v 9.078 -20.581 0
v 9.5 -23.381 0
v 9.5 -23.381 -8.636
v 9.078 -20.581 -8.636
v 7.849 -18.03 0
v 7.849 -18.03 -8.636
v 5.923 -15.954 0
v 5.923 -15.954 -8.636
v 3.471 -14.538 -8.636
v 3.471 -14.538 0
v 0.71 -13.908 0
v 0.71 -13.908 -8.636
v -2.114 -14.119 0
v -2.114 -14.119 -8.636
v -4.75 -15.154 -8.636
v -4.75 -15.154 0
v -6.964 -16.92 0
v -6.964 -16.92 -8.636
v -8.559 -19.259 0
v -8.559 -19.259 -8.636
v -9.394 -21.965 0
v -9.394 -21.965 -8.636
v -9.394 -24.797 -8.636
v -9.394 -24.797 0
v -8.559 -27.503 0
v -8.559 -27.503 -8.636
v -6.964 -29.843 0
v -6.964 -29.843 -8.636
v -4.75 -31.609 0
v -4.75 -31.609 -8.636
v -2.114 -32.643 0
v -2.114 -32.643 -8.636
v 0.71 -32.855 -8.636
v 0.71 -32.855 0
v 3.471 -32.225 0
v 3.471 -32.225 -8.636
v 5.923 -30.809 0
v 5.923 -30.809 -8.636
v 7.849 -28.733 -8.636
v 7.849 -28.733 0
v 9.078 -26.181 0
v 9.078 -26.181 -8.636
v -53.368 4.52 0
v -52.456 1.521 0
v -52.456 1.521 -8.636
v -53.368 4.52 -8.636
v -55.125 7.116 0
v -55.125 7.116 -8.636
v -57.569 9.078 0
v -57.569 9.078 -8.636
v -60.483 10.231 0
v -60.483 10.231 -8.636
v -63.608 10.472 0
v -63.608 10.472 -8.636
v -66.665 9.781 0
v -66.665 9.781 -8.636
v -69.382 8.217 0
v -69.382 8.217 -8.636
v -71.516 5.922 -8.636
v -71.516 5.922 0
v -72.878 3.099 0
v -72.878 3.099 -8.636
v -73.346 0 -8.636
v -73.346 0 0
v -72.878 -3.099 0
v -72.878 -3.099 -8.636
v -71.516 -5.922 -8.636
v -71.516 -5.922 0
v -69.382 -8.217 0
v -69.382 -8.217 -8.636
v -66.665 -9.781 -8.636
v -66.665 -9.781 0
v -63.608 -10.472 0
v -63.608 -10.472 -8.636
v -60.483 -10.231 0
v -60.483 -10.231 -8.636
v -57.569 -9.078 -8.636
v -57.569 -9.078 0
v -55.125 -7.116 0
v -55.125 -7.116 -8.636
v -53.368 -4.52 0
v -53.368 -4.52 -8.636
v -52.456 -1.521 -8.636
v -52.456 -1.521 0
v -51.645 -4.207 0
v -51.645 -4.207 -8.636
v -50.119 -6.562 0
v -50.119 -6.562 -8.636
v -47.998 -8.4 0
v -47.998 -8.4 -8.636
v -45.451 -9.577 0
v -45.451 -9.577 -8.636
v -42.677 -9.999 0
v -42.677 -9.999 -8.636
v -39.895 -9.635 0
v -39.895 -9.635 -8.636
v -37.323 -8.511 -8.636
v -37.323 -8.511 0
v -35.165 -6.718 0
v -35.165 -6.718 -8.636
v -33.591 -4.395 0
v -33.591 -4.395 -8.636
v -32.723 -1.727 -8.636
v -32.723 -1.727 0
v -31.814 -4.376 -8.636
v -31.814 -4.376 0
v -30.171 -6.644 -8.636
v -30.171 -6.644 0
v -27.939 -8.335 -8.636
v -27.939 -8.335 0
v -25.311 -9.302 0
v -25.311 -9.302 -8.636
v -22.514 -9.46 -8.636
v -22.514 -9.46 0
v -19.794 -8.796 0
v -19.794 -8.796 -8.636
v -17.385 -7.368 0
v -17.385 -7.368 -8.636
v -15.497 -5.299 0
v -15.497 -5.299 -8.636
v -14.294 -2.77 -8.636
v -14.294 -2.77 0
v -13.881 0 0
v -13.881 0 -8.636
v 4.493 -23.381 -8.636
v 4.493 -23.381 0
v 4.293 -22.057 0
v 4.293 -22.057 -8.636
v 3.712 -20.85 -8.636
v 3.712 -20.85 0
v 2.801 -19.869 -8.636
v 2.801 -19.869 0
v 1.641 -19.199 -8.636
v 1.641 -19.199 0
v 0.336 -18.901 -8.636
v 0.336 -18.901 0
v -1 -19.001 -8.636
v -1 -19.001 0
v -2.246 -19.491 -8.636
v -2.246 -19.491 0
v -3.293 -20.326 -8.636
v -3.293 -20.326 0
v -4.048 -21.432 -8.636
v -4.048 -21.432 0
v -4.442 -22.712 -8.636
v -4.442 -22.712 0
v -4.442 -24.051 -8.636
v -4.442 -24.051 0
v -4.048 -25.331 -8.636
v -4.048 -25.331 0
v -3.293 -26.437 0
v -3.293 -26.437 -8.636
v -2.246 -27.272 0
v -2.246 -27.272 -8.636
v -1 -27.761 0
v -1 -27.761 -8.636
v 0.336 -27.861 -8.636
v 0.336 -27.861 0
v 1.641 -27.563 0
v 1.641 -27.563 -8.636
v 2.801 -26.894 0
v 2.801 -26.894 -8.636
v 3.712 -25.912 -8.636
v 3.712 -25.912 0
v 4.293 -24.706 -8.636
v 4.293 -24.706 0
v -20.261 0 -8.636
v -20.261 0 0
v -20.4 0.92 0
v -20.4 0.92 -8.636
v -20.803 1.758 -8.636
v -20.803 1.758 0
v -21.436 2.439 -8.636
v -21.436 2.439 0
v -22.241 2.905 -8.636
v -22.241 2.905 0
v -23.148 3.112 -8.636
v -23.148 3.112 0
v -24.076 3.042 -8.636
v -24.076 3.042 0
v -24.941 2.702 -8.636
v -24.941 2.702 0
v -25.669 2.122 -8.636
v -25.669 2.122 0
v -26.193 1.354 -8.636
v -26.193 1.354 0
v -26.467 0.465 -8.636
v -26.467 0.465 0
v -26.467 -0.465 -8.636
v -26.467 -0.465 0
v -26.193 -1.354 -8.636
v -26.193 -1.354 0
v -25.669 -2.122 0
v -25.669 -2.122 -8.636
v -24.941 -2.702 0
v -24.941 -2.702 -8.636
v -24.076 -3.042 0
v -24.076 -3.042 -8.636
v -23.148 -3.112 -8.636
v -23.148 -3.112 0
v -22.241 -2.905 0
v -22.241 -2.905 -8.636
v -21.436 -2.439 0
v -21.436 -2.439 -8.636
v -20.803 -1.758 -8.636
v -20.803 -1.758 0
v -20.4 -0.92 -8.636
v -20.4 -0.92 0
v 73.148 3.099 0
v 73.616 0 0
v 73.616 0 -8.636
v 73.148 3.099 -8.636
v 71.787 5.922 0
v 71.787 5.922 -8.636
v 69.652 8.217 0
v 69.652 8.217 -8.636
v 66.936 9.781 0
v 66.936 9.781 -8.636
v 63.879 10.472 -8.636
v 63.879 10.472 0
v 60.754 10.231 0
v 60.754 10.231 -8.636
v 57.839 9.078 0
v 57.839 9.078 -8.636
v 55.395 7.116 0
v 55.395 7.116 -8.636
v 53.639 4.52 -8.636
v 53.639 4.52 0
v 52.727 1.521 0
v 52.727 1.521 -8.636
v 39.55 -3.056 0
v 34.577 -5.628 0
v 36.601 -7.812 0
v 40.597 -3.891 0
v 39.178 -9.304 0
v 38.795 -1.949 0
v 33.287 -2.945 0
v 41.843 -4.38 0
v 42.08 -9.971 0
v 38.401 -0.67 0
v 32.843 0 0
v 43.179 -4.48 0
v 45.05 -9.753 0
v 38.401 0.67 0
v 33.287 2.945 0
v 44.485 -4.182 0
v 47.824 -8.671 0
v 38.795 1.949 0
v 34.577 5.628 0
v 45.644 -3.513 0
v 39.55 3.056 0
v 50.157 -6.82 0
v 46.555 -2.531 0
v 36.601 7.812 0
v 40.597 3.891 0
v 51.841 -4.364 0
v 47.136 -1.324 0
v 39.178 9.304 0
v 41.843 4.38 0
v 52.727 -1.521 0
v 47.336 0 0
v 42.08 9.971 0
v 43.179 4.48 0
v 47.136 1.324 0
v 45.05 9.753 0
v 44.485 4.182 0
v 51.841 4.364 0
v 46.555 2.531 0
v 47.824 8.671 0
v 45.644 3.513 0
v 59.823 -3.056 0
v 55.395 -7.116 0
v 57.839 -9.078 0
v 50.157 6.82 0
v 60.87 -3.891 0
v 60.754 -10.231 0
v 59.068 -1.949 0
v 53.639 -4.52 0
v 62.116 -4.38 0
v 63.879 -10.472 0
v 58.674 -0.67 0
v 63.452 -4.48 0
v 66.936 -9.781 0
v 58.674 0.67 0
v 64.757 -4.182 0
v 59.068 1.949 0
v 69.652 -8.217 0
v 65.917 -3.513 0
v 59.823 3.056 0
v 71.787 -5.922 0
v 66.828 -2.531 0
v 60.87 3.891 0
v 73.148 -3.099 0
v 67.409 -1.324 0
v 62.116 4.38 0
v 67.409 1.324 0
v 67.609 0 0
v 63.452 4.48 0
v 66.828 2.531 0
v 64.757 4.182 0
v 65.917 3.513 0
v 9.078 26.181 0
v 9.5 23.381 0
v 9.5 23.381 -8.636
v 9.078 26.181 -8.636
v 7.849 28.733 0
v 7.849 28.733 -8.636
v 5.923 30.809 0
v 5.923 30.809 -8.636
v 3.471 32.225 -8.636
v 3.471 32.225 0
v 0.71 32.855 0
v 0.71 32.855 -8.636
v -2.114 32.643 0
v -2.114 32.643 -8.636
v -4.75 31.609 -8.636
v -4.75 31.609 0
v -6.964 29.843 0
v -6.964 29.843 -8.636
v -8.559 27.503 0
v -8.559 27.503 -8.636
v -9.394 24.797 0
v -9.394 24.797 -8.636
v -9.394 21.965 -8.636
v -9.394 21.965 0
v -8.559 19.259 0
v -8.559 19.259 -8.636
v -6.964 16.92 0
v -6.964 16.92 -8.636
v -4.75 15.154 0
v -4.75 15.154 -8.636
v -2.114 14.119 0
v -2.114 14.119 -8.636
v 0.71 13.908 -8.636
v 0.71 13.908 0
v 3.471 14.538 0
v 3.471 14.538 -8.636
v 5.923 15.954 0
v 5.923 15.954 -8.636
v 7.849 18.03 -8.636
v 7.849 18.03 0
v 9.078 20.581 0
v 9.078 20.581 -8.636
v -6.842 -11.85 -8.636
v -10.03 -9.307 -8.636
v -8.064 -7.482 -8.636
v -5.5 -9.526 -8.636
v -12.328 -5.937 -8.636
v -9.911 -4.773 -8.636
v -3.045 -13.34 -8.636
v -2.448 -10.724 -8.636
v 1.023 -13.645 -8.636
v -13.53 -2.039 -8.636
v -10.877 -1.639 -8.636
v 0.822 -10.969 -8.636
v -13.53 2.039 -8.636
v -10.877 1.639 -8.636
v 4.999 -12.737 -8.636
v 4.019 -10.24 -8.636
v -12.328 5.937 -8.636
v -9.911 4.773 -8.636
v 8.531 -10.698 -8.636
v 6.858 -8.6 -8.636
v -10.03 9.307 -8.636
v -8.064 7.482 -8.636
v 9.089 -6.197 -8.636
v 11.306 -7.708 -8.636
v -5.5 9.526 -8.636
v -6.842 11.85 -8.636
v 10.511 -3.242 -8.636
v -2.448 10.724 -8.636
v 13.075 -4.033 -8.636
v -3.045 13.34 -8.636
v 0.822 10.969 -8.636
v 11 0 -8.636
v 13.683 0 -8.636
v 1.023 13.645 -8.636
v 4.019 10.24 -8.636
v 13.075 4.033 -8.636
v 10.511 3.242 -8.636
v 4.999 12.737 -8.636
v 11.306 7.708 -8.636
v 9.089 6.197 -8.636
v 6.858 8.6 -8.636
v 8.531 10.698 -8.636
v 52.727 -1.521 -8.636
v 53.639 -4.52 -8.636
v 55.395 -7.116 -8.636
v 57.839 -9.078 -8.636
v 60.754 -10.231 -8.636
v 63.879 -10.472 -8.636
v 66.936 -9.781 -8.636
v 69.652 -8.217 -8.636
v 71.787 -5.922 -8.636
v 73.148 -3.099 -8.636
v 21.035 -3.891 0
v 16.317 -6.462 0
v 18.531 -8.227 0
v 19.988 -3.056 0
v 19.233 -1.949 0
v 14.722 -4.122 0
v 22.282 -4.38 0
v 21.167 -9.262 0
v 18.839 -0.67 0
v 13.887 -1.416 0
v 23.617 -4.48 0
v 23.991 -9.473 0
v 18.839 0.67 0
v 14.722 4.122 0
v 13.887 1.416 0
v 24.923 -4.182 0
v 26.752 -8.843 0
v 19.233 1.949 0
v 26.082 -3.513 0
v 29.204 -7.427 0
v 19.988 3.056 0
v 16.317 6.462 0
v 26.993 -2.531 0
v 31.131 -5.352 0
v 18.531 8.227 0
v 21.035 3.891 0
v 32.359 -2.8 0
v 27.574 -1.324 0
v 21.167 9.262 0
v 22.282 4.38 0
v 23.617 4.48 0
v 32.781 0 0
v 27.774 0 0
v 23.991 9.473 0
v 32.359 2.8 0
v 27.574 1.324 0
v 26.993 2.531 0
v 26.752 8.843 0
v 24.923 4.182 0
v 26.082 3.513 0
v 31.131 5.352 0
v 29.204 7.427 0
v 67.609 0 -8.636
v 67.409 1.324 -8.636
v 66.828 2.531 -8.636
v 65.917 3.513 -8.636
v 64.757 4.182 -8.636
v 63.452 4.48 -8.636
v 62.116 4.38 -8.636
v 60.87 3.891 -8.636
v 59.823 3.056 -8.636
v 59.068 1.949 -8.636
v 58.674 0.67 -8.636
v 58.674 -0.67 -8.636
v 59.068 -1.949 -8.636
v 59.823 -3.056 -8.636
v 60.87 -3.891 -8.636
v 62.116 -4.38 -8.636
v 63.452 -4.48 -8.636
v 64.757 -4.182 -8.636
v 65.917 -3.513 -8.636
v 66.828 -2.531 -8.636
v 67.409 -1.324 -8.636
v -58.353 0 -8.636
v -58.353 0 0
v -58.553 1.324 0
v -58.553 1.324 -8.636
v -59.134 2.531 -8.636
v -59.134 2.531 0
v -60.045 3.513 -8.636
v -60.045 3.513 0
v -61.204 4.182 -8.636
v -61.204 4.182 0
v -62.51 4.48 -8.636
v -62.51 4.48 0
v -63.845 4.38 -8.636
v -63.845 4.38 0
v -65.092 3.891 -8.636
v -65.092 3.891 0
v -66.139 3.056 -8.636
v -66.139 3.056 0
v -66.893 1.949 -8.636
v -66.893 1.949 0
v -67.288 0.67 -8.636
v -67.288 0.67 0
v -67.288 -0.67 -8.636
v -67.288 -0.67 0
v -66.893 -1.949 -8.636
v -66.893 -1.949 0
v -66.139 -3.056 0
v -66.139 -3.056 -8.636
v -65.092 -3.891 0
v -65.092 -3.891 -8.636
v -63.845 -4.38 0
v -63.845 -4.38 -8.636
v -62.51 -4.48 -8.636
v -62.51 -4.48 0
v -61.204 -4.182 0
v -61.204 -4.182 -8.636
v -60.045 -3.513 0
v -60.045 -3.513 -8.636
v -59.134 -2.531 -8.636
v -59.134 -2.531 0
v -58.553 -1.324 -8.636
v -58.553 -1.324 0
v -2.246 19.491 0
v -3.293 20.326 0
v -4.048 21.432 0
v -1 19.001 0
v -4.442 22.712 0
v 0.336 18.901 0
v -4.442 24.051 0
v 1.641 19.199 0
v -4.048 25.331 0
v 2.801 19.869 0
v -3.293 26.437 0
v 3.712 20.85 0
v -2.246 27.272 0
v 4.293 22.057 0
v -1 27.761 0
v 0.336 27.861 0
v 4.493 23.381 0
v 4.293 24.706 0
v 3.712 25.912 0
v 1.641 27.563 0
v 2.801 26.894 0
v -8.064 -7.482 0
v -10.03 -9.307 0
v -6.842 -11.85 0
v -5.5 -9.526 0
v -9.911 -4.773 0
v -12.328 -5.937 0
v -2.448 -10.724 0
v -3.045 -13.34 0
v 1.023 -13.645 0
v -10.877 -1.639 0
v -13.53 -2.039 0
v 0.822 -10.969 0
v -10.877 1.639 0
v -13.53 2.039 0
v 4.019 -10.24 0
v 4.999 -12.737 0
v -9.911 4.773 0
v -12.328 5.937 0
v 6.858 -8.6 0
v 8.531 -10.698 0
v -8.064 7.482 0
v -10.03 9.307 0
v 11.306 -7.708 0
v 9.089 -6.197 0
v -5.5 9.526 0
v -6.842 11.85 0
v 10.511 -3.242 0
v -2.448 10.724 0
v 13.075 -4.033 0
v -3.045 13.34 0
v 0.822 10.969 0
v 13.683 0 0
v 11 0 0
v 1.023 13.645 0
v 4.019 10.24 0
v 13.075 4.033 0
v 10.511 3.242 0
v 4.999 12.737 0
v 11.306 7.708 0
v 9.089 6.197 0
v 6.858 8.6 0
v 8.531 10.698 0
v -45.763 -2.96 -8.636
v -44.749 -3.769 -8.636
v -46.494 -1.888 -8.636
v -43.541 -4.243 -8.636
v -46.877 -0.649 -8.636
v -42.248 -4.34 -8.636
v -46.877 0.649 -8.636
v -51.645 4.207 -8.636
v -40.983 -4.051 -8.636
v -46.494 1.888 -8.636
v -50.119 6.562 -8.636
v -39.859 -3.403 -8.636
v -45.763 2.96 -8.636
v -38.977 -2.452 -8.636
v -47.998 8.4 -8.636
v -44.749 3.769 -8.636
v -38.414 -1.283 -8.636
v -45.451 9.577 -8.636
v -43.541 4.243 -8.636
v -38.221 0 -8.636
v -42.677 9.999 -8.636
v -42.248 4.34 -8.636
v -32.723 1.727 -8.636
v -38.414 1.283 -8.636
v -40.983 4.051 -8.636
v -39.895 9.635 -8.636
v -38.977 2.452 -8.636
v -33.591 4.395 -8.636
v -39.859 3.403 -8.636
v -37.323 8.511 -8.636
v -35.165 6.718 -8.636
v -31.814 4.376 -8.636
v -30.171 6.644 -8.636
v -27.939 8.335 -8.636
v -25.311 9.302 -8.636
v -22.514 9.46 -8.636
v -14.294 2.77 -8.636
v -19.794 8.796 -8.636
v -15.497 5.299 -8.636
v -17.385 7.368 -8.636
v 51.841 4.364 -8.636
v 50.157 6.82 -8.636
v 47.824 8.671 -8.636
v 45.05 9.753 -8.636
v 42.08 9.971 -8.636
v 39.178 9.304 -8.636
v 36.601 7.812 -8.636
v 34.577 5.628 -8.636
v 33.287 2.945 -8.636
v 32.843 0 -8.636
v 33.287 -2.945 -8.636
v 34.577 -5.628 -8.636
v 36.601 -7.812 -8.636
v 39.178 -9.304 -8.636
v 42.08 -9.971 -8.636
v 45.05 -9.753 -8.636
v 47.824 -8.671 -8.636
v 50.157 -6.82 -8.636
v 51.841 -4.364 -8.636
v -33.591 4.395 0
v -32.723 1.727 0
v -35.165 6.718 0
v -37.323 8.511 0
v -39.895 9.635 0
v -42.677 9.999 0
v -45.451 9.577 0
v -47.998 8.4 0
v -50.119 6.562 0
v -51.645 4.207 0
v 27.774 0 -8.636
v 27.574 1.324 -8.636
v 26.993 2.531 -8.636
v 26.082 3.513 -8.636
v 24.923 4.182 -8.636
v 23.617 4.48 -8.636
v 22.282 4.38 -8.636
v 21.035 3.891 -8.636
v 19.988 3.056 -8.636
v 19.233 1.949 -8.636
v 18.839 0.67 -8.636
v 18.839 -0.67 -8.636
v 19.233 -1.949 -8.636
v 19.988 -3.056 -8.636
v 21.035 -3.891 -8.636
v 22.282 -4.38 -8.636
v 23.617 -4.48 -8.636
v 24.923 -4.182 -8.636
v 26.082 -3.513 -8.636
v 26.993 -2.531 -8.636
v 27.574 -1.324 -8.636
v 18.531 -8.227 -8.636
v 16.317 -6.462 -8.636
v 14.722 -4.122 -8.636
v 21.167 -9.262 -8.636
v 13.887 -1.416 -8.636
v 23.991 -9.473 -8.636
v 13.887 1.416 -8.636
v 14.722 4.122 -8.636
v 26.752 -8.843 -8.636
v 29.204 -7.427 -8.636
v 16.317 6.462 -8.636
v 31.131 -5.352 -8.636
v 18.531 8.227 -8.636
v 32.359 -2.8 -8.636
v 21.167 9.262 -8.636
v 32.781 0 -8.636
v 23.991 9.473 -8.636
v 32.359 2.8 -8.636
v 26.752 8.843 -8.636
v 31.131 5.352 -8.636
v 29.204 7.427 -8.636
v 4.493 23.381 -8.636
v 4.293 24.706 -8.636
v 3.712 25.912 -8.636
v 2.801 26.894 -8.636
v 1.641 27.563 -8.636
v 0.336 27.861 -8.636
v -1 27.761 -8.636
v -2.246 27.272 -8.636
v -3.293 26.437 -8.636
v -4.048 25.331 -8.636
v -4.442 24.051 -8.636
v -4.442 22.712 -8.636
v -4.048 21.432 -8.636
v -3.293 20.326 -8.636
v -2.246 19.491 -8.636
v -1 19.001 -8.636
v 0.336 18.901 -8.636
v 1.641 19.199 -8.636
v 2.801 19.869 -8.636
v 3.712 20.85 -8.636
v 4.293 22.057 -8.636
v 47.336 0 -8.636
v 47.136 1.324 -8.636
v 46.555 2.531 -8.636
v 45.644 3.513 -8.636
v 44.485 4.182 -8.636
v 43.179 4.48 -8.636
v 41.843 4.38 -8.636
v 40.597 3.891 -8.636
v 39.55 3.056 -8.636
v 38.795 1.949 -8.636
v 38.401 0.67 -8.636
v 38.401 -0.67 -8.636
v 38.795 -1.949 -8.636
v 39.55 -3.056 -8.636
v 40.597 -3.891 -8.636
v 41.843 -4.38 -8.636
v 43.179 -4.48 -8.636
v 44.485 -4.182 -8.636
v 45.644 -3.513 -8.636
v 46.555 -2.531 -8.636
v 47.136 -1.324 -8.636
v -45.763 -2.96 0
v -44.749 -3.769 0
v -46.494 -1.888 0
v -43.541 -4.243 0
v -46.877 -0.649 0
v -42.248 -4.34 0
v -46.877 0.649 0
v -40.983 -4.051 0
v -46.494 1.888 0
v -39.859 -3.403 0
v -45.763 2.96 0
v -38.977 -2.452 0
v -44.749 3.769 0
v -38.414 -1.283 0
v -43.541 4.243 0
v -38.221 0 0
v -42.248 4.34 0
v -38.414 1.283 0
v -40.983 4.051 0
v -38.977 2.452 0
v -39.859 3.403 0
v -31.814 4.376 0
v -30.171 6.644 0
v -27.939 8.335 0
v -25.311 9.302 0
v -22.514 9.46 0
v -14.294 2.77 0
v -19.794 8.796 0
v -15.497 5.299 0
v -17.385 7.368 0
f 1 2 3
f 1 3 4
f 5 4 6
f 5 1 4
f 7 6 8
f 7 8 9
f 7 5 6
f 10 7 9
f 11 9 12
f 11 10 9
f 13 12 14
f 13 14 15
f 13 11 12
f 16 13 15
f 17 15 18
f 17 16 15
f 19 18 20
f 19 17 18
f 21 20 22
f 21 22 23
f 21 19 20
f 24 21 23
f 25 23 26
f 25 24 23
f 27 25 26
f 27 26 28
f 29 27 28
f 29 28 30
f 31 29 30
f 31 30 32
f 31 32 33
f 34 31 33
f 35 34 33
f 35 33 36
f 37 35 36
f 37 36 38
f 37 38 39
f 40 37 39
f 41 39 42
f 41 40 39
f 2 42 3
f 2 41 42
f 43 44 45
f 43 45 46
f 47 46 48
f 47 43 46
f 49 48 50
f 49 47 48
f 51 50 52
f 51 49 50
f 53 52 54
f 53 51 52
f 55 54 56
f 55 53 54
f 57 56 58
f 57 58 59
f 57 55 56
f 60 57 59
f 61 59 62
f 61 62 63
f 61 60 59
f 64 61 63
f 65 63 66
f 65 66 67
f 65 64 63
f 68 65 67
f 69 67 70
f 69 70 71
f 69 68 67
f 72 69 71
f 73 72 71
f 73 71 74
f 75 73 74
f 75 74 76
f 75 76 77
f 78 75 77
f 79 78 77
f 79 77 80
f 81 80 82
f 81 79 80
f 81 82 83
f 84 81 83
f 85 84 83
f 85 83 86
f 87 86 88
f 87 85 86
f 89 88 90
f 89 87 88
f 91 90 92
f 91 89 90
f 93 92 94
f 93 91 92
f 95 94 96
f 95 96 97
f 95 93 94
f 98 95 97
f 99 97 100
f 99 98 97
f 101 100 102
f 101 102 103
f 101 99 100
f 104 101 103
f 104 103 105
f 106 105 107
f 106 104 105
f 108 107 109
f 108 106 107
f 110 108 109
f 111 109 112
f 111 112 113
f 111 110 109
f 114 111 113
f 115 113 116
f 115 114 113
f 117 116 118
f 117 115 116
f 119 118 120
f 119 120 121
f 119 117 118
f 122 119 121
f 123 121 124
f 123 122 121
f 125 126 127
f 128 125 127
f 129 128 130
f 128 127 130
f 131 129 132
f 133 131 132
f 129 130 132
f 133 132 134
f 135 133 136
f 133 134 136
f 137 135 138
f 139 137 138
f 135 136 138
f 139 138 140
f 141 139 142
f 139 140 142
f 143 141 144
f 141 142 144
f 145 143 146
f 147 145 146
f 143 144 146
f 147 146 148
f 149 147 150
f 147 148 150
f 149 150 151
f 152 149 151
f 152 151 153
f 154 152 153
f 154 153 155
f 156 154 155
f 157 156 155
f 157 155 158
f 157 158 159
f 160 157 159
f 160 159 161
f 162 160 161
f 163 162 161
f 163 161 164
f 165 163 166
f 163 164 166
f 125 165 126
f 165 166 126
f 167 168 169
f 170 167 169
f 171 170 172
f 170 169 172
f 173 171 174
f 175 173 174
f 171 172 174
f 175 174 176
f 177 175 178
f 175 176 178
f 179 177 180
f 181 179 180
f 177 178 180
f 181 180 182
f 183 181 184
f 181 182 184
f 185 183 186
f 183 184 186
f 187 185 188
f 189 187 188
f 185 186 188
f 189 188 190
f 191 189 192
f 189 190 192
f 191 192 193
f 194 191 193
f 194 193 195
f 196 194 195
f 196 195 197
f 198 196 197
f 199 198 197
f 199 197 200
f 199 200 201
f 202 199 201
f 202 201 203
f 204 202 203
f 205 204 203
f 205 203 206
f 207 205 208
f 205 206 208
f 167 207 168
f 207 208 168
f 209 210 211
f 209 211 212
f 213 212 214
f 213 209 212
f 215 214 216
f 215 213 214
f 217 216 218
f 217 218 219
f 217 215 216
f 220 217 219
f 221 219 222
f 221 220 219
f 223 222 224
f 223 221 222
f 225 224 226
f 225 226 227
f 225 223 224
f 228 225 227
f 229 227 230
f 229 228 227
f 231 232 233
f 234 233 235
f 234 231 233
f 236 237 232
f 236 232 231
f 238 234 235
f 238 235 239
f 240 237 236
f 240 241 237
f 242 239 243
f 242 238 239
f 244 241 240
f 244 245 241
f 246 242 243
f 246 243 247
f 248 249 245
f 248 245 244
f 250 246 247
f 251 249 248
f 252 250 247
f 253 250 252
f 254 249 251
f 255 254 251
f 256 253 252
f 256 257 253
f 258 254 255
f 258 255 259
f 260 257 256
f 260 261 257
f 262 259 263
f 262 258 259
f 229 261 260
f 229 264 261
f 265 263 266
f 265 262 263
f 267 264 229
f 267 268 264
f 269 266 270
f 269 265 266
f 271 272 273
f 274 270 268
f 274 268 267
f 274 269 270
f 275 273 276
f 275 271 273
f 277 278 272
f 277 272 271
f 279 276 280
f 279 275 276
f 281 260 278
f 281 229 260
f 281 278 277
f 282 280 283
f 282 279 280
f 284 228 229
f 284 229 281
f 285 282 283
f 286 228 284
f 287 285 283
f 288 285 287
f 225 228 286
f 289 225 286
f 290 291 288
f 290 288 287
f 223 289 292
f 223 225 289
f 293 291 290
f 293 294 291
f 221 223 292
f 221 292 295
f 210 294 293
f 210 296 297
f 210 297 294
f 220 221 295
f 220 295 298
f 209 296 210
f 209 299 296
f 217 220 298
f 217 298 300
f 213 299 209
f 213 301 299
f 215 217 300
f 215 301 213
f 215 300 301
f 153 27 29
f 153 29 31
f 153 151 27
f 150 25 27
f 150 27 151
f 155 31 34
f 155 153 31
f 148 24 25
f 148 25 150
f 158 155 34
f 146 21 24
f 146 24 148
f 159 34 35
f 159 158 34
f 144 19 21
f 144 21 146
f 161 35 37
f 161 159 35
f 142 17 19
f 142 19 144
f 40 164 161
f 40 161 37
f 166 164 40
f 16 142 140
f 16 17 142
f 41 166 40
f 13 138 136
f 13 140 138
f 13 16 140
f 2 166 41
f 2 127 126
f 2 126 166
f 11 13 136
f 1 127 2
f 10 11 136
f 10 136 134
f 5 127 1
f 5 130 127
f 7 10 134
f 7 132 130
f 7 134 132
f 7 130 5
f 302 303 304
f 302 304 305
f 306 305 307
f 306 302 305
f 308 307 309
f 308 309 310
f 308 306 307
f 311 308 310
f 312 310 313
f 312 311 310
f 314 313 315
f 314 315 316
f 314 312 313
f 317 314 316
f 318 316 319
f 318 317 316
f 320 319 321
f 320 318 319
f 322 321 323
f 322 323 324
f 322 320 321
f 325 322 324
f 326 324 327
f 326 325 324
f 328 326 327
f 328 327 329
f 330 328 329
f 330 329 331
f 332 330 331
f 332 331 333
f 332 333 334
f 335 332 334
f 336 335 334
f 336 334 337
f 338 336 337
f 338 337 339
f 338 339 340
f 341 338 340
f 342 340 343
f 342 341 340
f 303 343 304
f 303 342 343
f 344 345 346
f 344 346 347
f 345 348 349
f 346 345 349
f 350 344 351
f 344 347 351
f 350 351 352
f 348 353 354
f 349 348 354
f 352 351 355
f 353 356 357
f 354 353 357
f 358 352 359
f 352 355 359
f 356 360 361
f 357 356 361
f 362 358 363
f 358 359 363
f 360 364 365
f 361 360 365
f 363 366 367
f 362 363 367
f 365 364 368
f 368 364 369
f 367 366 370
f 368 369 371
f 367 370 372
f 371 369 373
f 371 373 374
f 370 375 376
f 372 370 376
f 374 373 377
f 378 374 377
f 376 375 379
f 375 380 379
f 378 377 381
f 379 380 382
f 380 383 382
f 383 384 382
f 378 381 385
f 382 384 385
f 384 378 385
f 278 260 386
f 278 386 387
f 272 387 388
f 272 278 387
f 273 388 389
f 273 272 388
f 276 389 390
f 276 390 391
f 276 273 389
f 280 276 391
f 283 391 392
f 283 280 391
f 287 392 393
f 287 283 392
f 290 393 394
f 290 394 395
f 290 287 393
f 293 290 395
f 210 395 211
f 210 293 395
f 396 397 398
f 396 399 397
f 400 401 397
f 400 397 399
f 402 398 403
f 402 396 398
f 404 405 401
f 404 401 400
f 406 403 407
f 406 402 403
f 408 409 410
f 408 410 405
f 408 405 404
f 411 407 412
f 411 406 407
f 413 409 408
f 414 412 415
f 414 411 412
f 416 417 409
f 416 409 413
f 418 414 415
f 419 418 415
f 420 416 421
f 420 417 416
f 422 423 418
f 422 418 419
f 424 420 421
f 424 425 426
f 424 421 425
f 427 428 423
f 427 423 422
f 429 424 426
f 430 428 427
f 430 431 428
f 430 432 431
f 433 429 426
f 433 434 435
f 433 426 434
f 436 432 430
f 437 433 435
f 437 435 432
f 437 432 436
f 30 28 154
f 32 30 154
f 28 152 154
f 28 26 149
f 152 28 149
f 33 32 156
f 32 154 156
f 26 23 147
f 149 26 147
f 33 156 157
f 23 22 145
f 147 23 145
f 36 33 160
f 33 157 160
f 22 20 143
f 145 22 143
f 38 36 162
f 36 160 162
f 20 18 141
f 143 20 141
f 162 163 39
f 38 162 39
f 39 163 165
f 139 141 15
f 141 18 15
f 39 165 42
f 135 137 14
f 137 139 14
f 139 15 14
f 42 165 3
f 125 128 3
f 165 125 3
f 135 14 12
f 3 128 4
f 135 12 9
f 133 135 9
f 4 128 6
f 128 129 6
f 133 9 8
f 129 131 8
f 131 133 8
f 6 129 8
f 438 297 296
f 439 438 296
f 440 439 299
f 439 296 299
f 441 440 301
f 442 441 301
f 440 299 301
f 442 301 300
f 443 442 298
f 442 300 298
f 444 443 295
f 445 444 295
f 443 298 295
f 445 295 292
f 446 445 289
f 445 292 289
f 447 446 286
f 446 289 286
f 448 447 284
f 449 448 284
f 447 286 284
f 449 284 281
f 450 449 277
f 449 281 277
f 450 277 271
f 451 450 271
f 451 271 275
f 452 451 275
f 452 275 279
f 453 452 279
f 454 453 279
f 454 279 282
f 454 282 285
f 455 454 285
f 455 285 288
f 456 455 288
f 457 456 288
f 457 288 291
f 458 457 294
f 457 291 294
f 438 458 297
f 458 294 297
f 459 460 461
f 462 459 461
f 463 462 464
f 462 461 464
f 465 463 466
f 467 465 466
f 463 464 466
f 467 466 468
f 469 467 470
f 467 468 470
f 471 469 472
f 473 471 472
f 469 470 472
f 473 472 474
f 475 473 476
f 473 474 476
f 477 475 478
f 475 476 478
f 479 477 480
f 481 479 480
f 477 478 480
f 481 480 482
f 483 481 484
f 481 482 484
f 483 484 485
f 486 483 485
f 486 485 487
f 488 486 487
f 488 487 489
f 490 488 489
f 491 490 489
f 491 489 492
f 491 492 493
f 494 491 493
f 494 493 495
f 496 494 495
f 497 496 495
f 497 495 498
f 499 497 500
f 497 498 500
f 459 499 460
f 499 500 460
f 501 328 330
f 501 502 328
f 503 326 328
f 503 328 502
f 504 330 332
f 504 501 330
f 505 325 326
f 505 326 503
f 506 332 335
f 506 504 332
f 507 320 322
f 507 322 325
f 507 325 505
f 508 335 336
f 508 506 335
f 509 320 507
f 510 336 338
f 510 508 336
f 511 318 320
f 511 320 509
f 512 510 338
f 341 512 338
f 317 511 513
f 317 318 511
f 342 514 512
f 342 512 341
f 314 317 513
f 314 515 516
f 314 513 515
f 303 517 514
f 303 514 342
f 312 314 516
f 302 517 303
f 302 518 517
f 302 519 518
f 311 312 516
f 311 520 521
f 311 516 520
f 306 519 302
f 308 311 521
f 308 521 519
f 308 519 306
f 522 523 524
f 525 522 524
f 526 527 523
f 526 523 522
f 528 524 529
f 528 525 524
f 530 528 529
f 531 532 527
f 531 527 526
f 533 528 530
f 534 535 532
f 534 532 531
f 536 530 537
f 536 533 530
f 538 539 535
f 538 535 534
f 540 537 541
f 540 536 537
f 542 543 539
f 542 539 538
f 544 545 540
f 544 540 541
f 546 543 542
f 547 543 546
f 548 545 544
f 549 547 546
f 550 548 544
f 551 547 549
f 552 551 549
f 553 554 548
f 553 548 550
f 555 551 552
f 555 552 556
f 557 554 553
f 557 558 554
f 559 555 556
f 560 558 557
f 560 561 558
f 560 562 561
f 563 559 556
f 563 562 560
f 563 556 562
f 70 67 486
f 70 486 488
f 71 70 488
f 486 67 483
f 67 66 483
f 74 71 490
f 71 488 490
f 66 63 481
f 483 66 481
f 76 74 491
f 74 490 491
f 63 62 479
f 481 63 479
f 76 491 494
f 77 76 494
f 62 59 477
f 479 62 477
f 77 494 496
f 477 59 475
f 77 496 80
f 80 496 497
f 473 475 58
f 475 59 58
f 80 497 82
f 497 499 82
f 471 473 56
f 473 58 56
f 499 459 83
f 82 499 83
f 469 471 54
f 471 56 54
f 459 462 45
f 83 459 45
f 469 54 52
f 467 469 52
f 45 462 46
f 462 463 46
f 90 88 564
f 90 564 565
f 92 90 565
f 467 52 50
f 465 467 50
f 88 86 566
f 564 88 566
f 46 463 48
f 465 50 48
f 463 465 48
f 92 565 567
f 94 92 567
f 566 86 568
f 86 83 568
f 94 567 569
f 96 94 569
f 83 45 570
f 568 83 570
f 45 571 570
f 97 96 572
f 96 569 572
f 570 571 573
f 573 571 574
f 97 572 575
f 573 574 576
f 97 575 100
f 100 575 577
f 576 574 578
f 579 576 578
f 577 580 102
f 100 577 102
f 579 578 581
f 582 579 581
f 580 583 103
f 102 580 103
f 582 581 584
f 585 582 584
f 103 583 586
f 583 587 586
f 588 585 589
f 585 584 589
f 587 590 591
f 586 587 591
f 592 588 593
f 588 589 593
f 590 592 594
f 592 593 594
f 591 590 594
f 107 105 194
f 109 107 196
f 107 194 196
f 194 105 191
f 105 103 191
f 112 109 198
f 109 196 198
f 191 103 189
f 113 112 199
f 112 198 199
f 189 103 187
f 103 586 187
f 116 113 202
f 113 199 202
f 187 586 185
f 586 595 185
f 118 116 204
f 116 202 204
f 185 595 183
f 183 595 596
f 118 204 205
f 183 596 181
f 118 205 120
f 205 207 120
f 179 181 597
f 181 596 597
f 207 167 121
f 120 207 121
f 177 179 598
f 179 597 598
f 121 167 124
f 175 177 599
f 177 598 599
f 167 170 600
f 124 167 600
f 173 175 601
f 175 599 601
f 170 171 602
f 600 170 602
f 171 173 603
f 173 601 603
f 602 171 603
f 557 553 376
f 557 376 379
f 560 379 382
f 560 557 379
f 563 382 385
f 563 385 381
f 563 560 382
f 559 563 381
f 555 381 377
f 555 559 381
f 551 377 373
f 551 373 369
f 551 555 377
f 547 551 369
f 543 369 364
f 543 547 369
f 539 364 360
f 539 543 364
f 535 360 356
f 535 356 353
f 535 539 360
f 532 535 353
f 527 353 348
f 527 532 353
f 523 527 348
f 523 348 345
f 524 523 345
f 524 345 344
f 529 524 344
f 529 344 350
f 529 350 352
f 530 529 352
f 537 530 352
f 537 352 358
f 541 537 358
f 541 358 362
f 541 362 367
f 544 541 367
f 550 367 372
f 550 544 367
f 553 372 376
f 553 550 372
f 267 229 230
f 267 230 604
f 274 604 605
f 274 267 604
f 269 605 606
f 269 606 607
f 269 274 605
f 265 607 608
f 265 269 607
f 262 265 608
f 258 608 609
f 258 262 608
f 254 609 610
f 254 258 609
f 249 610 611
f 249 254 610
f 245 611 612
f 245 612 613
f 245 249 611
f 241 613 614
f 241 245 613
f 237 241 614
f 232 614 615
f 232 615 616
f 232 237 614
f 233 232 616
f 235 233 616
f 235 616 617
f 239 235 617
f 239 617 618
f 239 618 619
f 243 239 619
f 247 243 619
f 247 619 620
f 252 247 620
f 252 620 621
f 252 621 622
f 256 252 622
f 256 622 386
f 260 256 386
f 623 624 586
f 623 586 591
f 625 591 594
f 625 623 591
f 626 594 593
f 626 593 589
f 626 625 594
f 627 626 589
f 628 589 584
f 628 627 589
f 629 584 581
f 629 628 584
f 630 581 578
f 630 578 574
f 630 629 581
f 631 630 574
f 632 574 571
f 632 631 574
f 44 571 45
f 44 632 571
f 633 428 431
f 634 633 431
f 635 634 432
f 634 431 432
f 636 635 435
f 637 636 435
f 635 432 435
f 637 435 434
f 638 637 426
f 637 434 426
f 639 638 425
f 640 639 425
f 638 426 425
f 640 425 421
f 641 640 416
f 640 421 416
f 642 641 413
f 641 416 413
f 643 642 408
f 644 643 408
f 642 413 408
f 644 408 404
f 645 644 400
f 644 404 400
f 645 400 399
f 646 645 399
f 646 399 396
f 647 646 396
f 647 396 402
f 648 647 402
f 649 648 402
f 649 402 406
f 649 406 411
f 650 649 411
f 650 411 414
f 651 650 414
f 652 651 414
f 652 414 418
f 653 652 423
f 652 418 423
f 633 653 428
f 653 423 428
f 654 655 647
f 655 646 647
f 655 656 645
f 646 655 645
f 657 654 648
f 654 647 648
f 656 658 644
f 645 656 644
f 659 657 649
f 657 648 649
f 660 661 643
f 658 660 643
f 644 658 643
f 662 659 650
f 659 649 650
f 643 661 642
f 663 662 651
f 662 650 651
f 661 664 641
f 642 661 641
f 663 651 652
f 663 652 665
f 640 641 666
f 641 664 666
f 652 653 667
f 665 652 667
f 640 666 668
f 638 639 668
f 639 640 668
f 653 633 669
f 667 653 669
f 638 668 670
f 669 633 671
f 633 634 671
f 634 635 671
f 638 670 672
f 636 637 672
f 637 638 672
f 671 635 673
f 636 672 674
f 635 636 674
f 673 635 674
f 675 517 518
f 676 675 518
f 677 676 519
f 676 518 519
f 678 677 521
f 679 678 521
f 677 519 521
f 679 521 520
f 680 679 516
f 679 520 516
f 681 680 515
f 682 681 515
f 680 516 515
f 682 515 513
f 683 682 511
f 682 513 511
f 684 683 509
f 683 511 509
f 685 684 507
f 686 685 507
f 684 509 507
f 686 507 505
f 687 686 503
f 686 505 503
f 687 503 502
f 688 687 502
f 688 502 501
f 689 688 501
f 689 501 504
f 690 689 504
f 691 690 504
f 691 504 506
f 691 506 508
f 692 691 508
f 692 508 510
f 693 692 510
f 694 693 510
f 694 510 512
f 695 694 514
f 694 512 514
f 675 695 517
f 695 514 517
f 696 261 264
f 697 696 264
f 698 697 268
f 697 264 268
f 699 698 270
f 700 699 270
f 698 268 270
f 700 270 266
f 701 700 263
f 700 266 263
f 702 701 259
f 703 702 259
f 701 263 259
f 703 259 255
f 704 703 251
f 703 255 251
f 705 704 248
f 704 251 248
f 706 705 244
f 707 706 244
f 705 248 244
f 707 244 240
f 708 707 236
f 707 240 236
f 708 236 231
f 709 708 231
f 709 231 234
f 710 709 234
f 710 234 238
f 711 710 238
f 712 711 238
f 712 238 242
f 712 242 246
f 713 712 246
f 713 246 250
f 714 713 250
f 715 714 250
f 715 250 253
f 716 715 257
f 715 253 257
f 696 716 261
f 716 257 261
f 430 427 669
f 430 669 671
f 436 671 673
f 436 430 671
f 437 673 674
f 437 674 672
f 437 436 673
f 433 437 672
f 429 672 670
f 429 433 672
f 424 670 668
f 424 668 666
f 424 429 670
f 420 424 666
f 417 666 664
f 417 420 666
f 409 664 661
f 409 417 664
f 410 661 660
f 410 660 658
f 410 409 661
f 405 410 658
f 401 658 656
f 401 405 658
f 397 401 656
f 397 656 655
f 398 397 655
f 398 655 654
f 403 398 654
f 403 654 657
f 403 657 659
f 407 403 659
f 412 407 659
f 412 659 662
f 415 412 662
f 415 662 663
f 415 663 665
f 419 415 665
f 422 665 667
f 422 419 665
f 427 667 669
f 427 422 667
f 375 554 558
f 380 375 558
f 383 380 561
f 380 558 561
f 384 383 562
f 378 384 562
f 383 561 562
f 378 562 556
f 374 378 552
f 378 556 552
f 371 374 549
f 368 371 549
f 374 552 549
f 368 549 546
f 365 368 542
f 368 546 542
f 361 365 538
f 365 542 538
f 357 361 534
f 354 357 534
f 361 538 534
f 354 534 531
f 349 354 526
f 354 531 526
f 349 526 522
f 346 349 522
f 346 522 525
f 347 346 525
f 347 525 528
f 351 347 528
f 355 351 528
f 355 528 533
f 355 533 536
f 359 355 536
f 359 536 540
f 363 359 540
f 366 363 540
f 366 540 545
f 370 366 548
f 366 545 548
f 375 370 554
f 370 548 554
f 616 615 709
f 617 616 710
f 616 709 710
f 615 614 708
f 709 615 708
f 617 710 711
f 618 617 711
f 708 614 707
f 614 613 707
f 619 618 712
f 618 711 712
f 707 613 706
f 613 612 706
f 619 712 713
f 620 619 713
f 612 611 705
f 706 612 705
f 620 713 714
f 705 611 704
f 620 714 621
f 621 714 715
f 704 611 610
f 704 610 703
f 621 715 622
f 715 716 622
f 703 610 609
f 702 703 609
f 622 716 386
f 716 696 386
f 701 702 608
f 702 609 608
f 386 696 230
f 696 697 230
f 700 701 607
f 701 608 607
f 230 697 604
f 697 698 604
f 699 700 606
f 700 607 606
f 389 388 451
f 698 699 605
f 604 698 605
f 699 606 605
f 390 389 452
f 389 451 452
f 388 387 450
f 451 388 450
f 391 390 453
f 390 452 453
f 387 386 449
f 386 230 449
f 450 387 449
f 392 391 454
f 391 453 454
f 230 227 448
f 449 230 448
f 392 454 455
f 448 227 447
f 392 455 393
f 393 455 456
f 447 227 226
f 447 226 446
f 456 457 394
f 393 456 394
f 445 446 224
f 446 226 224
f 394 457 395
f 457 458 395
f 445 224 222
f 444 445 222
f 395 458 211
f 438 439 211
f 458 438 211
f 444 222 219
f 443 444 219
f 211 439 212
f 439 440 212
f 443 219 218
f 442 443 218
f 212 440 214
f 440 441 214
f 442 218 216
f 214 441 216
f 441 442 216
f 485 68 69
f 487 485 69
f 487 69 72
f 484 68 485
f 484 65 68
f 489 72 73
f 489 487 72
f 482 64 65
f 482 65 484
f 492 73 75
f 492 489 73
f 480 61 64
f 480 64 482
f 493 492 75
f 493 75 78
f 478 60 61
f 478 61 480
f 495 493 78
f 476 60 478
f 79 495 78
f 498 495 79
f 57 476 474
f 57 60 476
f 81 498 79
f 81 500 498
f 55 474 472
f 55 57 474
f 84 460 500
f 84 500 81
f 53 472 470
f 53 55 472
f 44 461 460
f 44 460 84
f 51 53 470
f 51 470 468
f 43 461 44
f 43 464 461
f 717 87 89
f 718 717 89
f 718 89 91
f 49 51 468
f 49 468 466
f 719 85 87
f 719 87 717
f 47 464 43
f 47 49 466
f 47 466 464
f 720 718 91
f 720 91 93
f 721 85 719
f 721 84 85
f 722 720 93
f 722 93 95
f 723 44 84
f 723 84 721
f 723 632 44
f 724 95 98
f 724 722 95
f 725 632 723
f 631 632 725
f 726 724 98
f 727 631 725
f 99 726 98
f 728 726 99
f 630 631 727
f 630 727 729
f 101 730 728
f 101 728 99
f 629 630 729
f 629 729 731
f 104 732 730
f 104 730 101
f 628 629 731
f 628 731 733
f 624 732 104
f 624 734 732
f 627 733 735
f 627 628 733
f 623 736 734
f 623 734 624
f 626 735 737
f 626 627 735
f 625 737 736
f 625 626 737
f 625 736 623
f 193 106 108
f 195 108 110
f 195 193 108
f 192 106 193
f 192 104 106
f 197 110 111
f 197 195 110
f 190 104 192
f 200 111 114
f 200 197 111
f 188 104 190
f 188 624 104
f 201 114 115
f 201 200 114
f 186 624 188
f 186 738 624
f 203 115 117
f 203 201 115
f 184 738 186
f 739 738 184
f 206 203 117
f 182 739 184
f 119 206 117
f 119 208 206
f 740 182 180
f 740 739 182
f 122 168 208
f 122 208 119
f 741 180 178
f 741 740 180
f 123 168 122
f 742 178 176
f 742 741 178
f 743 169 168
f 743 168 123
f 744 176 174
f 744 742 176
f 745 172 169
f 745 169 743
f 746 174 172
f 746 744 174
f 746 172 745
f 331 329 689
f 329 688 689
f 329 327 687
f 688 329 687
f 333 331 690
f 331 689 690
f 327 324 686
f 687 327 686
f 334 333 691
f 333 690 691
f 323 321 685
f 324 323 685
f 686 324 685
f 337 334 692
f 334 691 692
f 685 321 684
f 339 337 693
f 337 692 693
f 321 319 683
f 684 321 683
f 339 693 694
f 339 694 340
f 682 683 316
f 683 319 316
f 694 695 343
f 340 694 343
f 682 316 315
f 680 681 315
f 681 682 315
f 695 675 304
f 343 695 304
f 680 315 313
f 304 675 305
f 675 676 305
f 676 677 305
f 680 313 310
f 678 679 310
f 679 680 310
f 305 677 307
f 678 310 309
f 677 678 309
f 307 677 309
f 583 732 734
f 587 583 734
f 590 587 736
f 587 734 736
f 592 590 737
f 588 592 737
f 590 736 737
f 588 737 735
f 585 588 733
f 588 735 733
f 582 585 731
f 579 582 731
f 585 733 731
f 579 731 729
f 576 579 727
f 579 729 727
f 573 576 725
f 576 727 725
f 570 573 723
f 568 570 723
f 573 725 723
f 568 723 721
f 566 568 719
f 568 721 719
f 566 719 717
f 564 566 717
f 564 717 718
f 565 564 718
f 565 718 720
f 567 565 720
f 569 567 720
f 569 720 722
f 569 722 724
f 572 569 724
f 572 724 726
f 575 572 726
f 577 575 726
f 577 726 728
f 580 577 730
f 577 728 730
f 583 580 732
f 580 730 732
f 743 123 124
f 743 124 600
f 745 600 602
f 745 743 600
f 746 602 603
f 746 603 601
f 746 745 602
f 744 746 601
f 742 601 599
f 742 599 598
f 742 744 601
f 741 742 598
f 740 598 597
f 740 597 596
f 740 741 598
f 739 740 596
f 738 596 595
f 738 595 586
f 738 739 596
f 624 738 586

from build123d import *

# Parameters (mm, degrees)
F0_R     = 13.6831009892
F0_R_2   = 11
F1_DEPTH = 8.636
F0_R_3   = 9.5
F0_R_4   = 4.4926631
F0_R_5   = 3.1202264588
F0_R_6   = 4.3522325289
F0_R_7   = 4.4926613023


with BuildPart() as f1:
    # F0 (on Top) → F1 (new body)
    with BuildSketch(Plane.XY):
        Circle(F0_R)
        Circle(F0_R_2, mode=Mode.SUBTRACT)
    extrude(amount=-F1_DEPTH)


with BuildPart() as f1b:
    # F0 (on Top) → F1, piece 2 (new body)
    with BuildSketch(Plane.XY):
        with Locations((23.2812466269, 0)):
            Circle(F0_R_3)
        with Locations((23.2812466269, 0)):
            Circle(F0_R_4, mode=Mode.SUBTRACT)
    extrude(amount=-F1_DEPTH)


with BuildPart() as f1c:
    # F0 (on Top) → F1, piece 3 (new body)
    with BuildSketch(Plane.XY):
        with BuildLine():
            ThreePointArc((-32.7230773483, -1.7266154839), (-22.5143753138, -9.4603615745), (-13.8813002706, 0))
            ThreePointArc((-13.8813002706, 0), (-22.5143753138, 9.4603615745), (-32.7230773483, 1.7266154839))
            ThreePointArc((-32.7230773483, 1.7266154839), (-32.6105071995, 0.8665675718), (-32.572889477, 0))
            ThreePointArc((-32.572889477, 0), (-32.6105071995, -0.8665675718), (-32.7230773483, -1.7266154839))
        make_face()
        with Locations((-23.3813002706, 0)):
            Circle(F0_R_5, mode=Mode.SUBTRACT)
        with BuildLine():
            ThreePointArc((-32.572889477, 0), (-32.6105071995, 0.8665675718), (-32.7230773483, 1.7266154839))
            ThreePointArc((-32.7230773483, 1.7266154839), (-32.8813002706, 0), (-32.7230773483, -1.7266154839))
            ThreePointArc((-32.7230773483, -1.7266154839), (-32.6105071995, -0.8665675718), (-32.572889477, 0))
        make_face()
        with BuildLine():
            ThreePointArc((-32.7230773483, -1.7266154839), (-32.8813002706, 0), (-32.7230773483, 1.7266154839))
            ThreePointArc((-32.7230773483, 1.7266154839), (-42.6769106803, 9.9994589648), (-52.456489006, 1.521335055))
            ThreePointArc((-52.456489006, 1.521335055), (-52.3734279127, 0.7626821615), (-52.3456920385, 0))
            ThreePointArc((-52.3456920385, 0), (-52.3734279127, -0.7626821615), (-52.456489006, -1.521335055))
            ThreePointArc((-52.456489006, -1.521335055), (-42.6769106803, -9.9994589648), (-32.7230773483, -1.7266154839))
        make_face()
        with Locations((-42.572889477, 0)):
            Circle(F0_R_6, mode=Mode.SUBTRACT)
        with BuildLine():
            ThreePointArc((-52.3456920385, 0), (-52.3734279127, 0.7626821615), (-52.456489006, 1.521335055))
            ThreePointArc((-52.456489006, 1.521335055), (-52.572889477, 0), (-52.456489006, -1.521335055))
            ThreePointArc((-52.456489006, -1.521335055), (-52.3734279127, -0.7626821615), (-52.3456920385, 0))
        make_face()
        with BuildLine():
            ThreePointArc((-52.456489006, -1.521335055), (-52.572889477, 0), (-52.456489006, 1.521335055))
            ThreePointArc((-52.456489006, 1.521335055), (-73.3456920385, 0), (-52.456489006, -1.521335055))
        make_face()
        with Locations((-62.8456920385, 0)):
            Circle(F0_R_7, mode=Mode.SUBTRACT)
    extrude(amount=-F1_DEPTH)


with BuildPart() as f1d:
    # F0 (on Top) → F1, piece 4 (new body)
    with BuildSketch(Plane.XY):
        with Locations((0, 23.3813021332)):
            Circle(F0_R_3)
        with Locations((0, 23.3813021332)):
            Circle(F0_R_4, mode=Mode.SUBTRACT)
    extrude(amount=-F1_DEPTH)


with BuildPart() as f1e:
    # F0 (on Top) → F1, piece 5 (new body)
    with BuildSketch(Plane.XY):
        with Locations((0, -23.3813021332)):
            Circle(F0_R_3)
        with Locations((0, -23.3813021332)):
            Circle(F0_R_4, mode=Mode.SUBTRACT)
    extrude(amount=-F1_DEPTH)


with BuildPart() as f1f:
    # F0 (on Top) → F1, piece 6 (new body)
    with BuildSketch(Plane.XY):
        with BuildLine():
            ThreePointArc((52.7267904357, -1.5213474578), (52.8140497549, -0.7628970444), (52.8431928158, 0))
            ThreePointArc((52.8431928158, 0), (52.8140497549, 0.7628970444), (52.7267904357, 1.5213474578))
            ThreePointArc((52.7267904357, 1.5213474578), (52.615991652, 0), (52.7267904357, -1.5213474578))
        make_face()
        with BuildLine():
            ThreePointArc((52.7267904357, 1.5213474578), (52.8140497549, 0.7628970444), (52.8431928158, 0))
            ThreePointArc((52.8431928158, 0), (52.8140497549, -0.7628970444), (52.7267904357, -1.5213474578))
            ThreePointArc((52.7267904357, -1.5213474578), (63.8786800644, -10.4722636706), (73.615991652, 0))
            ThreePointArc((73.615991652, 0), (63.8786800644, 10.4722636706), (52.7267904357, 1.5213474578))
        make_face()
        with Locations((63.115991652, 0)):
            Circle(F0_R_4, mode=Mode.SUBTRACT)
        with BuildLine():
            ThreePointArc((52.7267904357, -1.5213474578), (52.615991652, 0), (52.7267904357, 1.5213474578))
            ThreePointArc((52.7267904357, 1.5213474578), (32.8431928158, 0), (52.7267904357, -1.5213474578))
        make_face()
        with Locations((42.8431928158, 0)):
            Circle(F0_R_4, mode=Mode.SUBTRACT)
    extrude(amount=-F1_DEPTH)


solid = Compound([f1.part, f1b.part, f1c.part, f1d.part, f1e.part, f1f.part])
